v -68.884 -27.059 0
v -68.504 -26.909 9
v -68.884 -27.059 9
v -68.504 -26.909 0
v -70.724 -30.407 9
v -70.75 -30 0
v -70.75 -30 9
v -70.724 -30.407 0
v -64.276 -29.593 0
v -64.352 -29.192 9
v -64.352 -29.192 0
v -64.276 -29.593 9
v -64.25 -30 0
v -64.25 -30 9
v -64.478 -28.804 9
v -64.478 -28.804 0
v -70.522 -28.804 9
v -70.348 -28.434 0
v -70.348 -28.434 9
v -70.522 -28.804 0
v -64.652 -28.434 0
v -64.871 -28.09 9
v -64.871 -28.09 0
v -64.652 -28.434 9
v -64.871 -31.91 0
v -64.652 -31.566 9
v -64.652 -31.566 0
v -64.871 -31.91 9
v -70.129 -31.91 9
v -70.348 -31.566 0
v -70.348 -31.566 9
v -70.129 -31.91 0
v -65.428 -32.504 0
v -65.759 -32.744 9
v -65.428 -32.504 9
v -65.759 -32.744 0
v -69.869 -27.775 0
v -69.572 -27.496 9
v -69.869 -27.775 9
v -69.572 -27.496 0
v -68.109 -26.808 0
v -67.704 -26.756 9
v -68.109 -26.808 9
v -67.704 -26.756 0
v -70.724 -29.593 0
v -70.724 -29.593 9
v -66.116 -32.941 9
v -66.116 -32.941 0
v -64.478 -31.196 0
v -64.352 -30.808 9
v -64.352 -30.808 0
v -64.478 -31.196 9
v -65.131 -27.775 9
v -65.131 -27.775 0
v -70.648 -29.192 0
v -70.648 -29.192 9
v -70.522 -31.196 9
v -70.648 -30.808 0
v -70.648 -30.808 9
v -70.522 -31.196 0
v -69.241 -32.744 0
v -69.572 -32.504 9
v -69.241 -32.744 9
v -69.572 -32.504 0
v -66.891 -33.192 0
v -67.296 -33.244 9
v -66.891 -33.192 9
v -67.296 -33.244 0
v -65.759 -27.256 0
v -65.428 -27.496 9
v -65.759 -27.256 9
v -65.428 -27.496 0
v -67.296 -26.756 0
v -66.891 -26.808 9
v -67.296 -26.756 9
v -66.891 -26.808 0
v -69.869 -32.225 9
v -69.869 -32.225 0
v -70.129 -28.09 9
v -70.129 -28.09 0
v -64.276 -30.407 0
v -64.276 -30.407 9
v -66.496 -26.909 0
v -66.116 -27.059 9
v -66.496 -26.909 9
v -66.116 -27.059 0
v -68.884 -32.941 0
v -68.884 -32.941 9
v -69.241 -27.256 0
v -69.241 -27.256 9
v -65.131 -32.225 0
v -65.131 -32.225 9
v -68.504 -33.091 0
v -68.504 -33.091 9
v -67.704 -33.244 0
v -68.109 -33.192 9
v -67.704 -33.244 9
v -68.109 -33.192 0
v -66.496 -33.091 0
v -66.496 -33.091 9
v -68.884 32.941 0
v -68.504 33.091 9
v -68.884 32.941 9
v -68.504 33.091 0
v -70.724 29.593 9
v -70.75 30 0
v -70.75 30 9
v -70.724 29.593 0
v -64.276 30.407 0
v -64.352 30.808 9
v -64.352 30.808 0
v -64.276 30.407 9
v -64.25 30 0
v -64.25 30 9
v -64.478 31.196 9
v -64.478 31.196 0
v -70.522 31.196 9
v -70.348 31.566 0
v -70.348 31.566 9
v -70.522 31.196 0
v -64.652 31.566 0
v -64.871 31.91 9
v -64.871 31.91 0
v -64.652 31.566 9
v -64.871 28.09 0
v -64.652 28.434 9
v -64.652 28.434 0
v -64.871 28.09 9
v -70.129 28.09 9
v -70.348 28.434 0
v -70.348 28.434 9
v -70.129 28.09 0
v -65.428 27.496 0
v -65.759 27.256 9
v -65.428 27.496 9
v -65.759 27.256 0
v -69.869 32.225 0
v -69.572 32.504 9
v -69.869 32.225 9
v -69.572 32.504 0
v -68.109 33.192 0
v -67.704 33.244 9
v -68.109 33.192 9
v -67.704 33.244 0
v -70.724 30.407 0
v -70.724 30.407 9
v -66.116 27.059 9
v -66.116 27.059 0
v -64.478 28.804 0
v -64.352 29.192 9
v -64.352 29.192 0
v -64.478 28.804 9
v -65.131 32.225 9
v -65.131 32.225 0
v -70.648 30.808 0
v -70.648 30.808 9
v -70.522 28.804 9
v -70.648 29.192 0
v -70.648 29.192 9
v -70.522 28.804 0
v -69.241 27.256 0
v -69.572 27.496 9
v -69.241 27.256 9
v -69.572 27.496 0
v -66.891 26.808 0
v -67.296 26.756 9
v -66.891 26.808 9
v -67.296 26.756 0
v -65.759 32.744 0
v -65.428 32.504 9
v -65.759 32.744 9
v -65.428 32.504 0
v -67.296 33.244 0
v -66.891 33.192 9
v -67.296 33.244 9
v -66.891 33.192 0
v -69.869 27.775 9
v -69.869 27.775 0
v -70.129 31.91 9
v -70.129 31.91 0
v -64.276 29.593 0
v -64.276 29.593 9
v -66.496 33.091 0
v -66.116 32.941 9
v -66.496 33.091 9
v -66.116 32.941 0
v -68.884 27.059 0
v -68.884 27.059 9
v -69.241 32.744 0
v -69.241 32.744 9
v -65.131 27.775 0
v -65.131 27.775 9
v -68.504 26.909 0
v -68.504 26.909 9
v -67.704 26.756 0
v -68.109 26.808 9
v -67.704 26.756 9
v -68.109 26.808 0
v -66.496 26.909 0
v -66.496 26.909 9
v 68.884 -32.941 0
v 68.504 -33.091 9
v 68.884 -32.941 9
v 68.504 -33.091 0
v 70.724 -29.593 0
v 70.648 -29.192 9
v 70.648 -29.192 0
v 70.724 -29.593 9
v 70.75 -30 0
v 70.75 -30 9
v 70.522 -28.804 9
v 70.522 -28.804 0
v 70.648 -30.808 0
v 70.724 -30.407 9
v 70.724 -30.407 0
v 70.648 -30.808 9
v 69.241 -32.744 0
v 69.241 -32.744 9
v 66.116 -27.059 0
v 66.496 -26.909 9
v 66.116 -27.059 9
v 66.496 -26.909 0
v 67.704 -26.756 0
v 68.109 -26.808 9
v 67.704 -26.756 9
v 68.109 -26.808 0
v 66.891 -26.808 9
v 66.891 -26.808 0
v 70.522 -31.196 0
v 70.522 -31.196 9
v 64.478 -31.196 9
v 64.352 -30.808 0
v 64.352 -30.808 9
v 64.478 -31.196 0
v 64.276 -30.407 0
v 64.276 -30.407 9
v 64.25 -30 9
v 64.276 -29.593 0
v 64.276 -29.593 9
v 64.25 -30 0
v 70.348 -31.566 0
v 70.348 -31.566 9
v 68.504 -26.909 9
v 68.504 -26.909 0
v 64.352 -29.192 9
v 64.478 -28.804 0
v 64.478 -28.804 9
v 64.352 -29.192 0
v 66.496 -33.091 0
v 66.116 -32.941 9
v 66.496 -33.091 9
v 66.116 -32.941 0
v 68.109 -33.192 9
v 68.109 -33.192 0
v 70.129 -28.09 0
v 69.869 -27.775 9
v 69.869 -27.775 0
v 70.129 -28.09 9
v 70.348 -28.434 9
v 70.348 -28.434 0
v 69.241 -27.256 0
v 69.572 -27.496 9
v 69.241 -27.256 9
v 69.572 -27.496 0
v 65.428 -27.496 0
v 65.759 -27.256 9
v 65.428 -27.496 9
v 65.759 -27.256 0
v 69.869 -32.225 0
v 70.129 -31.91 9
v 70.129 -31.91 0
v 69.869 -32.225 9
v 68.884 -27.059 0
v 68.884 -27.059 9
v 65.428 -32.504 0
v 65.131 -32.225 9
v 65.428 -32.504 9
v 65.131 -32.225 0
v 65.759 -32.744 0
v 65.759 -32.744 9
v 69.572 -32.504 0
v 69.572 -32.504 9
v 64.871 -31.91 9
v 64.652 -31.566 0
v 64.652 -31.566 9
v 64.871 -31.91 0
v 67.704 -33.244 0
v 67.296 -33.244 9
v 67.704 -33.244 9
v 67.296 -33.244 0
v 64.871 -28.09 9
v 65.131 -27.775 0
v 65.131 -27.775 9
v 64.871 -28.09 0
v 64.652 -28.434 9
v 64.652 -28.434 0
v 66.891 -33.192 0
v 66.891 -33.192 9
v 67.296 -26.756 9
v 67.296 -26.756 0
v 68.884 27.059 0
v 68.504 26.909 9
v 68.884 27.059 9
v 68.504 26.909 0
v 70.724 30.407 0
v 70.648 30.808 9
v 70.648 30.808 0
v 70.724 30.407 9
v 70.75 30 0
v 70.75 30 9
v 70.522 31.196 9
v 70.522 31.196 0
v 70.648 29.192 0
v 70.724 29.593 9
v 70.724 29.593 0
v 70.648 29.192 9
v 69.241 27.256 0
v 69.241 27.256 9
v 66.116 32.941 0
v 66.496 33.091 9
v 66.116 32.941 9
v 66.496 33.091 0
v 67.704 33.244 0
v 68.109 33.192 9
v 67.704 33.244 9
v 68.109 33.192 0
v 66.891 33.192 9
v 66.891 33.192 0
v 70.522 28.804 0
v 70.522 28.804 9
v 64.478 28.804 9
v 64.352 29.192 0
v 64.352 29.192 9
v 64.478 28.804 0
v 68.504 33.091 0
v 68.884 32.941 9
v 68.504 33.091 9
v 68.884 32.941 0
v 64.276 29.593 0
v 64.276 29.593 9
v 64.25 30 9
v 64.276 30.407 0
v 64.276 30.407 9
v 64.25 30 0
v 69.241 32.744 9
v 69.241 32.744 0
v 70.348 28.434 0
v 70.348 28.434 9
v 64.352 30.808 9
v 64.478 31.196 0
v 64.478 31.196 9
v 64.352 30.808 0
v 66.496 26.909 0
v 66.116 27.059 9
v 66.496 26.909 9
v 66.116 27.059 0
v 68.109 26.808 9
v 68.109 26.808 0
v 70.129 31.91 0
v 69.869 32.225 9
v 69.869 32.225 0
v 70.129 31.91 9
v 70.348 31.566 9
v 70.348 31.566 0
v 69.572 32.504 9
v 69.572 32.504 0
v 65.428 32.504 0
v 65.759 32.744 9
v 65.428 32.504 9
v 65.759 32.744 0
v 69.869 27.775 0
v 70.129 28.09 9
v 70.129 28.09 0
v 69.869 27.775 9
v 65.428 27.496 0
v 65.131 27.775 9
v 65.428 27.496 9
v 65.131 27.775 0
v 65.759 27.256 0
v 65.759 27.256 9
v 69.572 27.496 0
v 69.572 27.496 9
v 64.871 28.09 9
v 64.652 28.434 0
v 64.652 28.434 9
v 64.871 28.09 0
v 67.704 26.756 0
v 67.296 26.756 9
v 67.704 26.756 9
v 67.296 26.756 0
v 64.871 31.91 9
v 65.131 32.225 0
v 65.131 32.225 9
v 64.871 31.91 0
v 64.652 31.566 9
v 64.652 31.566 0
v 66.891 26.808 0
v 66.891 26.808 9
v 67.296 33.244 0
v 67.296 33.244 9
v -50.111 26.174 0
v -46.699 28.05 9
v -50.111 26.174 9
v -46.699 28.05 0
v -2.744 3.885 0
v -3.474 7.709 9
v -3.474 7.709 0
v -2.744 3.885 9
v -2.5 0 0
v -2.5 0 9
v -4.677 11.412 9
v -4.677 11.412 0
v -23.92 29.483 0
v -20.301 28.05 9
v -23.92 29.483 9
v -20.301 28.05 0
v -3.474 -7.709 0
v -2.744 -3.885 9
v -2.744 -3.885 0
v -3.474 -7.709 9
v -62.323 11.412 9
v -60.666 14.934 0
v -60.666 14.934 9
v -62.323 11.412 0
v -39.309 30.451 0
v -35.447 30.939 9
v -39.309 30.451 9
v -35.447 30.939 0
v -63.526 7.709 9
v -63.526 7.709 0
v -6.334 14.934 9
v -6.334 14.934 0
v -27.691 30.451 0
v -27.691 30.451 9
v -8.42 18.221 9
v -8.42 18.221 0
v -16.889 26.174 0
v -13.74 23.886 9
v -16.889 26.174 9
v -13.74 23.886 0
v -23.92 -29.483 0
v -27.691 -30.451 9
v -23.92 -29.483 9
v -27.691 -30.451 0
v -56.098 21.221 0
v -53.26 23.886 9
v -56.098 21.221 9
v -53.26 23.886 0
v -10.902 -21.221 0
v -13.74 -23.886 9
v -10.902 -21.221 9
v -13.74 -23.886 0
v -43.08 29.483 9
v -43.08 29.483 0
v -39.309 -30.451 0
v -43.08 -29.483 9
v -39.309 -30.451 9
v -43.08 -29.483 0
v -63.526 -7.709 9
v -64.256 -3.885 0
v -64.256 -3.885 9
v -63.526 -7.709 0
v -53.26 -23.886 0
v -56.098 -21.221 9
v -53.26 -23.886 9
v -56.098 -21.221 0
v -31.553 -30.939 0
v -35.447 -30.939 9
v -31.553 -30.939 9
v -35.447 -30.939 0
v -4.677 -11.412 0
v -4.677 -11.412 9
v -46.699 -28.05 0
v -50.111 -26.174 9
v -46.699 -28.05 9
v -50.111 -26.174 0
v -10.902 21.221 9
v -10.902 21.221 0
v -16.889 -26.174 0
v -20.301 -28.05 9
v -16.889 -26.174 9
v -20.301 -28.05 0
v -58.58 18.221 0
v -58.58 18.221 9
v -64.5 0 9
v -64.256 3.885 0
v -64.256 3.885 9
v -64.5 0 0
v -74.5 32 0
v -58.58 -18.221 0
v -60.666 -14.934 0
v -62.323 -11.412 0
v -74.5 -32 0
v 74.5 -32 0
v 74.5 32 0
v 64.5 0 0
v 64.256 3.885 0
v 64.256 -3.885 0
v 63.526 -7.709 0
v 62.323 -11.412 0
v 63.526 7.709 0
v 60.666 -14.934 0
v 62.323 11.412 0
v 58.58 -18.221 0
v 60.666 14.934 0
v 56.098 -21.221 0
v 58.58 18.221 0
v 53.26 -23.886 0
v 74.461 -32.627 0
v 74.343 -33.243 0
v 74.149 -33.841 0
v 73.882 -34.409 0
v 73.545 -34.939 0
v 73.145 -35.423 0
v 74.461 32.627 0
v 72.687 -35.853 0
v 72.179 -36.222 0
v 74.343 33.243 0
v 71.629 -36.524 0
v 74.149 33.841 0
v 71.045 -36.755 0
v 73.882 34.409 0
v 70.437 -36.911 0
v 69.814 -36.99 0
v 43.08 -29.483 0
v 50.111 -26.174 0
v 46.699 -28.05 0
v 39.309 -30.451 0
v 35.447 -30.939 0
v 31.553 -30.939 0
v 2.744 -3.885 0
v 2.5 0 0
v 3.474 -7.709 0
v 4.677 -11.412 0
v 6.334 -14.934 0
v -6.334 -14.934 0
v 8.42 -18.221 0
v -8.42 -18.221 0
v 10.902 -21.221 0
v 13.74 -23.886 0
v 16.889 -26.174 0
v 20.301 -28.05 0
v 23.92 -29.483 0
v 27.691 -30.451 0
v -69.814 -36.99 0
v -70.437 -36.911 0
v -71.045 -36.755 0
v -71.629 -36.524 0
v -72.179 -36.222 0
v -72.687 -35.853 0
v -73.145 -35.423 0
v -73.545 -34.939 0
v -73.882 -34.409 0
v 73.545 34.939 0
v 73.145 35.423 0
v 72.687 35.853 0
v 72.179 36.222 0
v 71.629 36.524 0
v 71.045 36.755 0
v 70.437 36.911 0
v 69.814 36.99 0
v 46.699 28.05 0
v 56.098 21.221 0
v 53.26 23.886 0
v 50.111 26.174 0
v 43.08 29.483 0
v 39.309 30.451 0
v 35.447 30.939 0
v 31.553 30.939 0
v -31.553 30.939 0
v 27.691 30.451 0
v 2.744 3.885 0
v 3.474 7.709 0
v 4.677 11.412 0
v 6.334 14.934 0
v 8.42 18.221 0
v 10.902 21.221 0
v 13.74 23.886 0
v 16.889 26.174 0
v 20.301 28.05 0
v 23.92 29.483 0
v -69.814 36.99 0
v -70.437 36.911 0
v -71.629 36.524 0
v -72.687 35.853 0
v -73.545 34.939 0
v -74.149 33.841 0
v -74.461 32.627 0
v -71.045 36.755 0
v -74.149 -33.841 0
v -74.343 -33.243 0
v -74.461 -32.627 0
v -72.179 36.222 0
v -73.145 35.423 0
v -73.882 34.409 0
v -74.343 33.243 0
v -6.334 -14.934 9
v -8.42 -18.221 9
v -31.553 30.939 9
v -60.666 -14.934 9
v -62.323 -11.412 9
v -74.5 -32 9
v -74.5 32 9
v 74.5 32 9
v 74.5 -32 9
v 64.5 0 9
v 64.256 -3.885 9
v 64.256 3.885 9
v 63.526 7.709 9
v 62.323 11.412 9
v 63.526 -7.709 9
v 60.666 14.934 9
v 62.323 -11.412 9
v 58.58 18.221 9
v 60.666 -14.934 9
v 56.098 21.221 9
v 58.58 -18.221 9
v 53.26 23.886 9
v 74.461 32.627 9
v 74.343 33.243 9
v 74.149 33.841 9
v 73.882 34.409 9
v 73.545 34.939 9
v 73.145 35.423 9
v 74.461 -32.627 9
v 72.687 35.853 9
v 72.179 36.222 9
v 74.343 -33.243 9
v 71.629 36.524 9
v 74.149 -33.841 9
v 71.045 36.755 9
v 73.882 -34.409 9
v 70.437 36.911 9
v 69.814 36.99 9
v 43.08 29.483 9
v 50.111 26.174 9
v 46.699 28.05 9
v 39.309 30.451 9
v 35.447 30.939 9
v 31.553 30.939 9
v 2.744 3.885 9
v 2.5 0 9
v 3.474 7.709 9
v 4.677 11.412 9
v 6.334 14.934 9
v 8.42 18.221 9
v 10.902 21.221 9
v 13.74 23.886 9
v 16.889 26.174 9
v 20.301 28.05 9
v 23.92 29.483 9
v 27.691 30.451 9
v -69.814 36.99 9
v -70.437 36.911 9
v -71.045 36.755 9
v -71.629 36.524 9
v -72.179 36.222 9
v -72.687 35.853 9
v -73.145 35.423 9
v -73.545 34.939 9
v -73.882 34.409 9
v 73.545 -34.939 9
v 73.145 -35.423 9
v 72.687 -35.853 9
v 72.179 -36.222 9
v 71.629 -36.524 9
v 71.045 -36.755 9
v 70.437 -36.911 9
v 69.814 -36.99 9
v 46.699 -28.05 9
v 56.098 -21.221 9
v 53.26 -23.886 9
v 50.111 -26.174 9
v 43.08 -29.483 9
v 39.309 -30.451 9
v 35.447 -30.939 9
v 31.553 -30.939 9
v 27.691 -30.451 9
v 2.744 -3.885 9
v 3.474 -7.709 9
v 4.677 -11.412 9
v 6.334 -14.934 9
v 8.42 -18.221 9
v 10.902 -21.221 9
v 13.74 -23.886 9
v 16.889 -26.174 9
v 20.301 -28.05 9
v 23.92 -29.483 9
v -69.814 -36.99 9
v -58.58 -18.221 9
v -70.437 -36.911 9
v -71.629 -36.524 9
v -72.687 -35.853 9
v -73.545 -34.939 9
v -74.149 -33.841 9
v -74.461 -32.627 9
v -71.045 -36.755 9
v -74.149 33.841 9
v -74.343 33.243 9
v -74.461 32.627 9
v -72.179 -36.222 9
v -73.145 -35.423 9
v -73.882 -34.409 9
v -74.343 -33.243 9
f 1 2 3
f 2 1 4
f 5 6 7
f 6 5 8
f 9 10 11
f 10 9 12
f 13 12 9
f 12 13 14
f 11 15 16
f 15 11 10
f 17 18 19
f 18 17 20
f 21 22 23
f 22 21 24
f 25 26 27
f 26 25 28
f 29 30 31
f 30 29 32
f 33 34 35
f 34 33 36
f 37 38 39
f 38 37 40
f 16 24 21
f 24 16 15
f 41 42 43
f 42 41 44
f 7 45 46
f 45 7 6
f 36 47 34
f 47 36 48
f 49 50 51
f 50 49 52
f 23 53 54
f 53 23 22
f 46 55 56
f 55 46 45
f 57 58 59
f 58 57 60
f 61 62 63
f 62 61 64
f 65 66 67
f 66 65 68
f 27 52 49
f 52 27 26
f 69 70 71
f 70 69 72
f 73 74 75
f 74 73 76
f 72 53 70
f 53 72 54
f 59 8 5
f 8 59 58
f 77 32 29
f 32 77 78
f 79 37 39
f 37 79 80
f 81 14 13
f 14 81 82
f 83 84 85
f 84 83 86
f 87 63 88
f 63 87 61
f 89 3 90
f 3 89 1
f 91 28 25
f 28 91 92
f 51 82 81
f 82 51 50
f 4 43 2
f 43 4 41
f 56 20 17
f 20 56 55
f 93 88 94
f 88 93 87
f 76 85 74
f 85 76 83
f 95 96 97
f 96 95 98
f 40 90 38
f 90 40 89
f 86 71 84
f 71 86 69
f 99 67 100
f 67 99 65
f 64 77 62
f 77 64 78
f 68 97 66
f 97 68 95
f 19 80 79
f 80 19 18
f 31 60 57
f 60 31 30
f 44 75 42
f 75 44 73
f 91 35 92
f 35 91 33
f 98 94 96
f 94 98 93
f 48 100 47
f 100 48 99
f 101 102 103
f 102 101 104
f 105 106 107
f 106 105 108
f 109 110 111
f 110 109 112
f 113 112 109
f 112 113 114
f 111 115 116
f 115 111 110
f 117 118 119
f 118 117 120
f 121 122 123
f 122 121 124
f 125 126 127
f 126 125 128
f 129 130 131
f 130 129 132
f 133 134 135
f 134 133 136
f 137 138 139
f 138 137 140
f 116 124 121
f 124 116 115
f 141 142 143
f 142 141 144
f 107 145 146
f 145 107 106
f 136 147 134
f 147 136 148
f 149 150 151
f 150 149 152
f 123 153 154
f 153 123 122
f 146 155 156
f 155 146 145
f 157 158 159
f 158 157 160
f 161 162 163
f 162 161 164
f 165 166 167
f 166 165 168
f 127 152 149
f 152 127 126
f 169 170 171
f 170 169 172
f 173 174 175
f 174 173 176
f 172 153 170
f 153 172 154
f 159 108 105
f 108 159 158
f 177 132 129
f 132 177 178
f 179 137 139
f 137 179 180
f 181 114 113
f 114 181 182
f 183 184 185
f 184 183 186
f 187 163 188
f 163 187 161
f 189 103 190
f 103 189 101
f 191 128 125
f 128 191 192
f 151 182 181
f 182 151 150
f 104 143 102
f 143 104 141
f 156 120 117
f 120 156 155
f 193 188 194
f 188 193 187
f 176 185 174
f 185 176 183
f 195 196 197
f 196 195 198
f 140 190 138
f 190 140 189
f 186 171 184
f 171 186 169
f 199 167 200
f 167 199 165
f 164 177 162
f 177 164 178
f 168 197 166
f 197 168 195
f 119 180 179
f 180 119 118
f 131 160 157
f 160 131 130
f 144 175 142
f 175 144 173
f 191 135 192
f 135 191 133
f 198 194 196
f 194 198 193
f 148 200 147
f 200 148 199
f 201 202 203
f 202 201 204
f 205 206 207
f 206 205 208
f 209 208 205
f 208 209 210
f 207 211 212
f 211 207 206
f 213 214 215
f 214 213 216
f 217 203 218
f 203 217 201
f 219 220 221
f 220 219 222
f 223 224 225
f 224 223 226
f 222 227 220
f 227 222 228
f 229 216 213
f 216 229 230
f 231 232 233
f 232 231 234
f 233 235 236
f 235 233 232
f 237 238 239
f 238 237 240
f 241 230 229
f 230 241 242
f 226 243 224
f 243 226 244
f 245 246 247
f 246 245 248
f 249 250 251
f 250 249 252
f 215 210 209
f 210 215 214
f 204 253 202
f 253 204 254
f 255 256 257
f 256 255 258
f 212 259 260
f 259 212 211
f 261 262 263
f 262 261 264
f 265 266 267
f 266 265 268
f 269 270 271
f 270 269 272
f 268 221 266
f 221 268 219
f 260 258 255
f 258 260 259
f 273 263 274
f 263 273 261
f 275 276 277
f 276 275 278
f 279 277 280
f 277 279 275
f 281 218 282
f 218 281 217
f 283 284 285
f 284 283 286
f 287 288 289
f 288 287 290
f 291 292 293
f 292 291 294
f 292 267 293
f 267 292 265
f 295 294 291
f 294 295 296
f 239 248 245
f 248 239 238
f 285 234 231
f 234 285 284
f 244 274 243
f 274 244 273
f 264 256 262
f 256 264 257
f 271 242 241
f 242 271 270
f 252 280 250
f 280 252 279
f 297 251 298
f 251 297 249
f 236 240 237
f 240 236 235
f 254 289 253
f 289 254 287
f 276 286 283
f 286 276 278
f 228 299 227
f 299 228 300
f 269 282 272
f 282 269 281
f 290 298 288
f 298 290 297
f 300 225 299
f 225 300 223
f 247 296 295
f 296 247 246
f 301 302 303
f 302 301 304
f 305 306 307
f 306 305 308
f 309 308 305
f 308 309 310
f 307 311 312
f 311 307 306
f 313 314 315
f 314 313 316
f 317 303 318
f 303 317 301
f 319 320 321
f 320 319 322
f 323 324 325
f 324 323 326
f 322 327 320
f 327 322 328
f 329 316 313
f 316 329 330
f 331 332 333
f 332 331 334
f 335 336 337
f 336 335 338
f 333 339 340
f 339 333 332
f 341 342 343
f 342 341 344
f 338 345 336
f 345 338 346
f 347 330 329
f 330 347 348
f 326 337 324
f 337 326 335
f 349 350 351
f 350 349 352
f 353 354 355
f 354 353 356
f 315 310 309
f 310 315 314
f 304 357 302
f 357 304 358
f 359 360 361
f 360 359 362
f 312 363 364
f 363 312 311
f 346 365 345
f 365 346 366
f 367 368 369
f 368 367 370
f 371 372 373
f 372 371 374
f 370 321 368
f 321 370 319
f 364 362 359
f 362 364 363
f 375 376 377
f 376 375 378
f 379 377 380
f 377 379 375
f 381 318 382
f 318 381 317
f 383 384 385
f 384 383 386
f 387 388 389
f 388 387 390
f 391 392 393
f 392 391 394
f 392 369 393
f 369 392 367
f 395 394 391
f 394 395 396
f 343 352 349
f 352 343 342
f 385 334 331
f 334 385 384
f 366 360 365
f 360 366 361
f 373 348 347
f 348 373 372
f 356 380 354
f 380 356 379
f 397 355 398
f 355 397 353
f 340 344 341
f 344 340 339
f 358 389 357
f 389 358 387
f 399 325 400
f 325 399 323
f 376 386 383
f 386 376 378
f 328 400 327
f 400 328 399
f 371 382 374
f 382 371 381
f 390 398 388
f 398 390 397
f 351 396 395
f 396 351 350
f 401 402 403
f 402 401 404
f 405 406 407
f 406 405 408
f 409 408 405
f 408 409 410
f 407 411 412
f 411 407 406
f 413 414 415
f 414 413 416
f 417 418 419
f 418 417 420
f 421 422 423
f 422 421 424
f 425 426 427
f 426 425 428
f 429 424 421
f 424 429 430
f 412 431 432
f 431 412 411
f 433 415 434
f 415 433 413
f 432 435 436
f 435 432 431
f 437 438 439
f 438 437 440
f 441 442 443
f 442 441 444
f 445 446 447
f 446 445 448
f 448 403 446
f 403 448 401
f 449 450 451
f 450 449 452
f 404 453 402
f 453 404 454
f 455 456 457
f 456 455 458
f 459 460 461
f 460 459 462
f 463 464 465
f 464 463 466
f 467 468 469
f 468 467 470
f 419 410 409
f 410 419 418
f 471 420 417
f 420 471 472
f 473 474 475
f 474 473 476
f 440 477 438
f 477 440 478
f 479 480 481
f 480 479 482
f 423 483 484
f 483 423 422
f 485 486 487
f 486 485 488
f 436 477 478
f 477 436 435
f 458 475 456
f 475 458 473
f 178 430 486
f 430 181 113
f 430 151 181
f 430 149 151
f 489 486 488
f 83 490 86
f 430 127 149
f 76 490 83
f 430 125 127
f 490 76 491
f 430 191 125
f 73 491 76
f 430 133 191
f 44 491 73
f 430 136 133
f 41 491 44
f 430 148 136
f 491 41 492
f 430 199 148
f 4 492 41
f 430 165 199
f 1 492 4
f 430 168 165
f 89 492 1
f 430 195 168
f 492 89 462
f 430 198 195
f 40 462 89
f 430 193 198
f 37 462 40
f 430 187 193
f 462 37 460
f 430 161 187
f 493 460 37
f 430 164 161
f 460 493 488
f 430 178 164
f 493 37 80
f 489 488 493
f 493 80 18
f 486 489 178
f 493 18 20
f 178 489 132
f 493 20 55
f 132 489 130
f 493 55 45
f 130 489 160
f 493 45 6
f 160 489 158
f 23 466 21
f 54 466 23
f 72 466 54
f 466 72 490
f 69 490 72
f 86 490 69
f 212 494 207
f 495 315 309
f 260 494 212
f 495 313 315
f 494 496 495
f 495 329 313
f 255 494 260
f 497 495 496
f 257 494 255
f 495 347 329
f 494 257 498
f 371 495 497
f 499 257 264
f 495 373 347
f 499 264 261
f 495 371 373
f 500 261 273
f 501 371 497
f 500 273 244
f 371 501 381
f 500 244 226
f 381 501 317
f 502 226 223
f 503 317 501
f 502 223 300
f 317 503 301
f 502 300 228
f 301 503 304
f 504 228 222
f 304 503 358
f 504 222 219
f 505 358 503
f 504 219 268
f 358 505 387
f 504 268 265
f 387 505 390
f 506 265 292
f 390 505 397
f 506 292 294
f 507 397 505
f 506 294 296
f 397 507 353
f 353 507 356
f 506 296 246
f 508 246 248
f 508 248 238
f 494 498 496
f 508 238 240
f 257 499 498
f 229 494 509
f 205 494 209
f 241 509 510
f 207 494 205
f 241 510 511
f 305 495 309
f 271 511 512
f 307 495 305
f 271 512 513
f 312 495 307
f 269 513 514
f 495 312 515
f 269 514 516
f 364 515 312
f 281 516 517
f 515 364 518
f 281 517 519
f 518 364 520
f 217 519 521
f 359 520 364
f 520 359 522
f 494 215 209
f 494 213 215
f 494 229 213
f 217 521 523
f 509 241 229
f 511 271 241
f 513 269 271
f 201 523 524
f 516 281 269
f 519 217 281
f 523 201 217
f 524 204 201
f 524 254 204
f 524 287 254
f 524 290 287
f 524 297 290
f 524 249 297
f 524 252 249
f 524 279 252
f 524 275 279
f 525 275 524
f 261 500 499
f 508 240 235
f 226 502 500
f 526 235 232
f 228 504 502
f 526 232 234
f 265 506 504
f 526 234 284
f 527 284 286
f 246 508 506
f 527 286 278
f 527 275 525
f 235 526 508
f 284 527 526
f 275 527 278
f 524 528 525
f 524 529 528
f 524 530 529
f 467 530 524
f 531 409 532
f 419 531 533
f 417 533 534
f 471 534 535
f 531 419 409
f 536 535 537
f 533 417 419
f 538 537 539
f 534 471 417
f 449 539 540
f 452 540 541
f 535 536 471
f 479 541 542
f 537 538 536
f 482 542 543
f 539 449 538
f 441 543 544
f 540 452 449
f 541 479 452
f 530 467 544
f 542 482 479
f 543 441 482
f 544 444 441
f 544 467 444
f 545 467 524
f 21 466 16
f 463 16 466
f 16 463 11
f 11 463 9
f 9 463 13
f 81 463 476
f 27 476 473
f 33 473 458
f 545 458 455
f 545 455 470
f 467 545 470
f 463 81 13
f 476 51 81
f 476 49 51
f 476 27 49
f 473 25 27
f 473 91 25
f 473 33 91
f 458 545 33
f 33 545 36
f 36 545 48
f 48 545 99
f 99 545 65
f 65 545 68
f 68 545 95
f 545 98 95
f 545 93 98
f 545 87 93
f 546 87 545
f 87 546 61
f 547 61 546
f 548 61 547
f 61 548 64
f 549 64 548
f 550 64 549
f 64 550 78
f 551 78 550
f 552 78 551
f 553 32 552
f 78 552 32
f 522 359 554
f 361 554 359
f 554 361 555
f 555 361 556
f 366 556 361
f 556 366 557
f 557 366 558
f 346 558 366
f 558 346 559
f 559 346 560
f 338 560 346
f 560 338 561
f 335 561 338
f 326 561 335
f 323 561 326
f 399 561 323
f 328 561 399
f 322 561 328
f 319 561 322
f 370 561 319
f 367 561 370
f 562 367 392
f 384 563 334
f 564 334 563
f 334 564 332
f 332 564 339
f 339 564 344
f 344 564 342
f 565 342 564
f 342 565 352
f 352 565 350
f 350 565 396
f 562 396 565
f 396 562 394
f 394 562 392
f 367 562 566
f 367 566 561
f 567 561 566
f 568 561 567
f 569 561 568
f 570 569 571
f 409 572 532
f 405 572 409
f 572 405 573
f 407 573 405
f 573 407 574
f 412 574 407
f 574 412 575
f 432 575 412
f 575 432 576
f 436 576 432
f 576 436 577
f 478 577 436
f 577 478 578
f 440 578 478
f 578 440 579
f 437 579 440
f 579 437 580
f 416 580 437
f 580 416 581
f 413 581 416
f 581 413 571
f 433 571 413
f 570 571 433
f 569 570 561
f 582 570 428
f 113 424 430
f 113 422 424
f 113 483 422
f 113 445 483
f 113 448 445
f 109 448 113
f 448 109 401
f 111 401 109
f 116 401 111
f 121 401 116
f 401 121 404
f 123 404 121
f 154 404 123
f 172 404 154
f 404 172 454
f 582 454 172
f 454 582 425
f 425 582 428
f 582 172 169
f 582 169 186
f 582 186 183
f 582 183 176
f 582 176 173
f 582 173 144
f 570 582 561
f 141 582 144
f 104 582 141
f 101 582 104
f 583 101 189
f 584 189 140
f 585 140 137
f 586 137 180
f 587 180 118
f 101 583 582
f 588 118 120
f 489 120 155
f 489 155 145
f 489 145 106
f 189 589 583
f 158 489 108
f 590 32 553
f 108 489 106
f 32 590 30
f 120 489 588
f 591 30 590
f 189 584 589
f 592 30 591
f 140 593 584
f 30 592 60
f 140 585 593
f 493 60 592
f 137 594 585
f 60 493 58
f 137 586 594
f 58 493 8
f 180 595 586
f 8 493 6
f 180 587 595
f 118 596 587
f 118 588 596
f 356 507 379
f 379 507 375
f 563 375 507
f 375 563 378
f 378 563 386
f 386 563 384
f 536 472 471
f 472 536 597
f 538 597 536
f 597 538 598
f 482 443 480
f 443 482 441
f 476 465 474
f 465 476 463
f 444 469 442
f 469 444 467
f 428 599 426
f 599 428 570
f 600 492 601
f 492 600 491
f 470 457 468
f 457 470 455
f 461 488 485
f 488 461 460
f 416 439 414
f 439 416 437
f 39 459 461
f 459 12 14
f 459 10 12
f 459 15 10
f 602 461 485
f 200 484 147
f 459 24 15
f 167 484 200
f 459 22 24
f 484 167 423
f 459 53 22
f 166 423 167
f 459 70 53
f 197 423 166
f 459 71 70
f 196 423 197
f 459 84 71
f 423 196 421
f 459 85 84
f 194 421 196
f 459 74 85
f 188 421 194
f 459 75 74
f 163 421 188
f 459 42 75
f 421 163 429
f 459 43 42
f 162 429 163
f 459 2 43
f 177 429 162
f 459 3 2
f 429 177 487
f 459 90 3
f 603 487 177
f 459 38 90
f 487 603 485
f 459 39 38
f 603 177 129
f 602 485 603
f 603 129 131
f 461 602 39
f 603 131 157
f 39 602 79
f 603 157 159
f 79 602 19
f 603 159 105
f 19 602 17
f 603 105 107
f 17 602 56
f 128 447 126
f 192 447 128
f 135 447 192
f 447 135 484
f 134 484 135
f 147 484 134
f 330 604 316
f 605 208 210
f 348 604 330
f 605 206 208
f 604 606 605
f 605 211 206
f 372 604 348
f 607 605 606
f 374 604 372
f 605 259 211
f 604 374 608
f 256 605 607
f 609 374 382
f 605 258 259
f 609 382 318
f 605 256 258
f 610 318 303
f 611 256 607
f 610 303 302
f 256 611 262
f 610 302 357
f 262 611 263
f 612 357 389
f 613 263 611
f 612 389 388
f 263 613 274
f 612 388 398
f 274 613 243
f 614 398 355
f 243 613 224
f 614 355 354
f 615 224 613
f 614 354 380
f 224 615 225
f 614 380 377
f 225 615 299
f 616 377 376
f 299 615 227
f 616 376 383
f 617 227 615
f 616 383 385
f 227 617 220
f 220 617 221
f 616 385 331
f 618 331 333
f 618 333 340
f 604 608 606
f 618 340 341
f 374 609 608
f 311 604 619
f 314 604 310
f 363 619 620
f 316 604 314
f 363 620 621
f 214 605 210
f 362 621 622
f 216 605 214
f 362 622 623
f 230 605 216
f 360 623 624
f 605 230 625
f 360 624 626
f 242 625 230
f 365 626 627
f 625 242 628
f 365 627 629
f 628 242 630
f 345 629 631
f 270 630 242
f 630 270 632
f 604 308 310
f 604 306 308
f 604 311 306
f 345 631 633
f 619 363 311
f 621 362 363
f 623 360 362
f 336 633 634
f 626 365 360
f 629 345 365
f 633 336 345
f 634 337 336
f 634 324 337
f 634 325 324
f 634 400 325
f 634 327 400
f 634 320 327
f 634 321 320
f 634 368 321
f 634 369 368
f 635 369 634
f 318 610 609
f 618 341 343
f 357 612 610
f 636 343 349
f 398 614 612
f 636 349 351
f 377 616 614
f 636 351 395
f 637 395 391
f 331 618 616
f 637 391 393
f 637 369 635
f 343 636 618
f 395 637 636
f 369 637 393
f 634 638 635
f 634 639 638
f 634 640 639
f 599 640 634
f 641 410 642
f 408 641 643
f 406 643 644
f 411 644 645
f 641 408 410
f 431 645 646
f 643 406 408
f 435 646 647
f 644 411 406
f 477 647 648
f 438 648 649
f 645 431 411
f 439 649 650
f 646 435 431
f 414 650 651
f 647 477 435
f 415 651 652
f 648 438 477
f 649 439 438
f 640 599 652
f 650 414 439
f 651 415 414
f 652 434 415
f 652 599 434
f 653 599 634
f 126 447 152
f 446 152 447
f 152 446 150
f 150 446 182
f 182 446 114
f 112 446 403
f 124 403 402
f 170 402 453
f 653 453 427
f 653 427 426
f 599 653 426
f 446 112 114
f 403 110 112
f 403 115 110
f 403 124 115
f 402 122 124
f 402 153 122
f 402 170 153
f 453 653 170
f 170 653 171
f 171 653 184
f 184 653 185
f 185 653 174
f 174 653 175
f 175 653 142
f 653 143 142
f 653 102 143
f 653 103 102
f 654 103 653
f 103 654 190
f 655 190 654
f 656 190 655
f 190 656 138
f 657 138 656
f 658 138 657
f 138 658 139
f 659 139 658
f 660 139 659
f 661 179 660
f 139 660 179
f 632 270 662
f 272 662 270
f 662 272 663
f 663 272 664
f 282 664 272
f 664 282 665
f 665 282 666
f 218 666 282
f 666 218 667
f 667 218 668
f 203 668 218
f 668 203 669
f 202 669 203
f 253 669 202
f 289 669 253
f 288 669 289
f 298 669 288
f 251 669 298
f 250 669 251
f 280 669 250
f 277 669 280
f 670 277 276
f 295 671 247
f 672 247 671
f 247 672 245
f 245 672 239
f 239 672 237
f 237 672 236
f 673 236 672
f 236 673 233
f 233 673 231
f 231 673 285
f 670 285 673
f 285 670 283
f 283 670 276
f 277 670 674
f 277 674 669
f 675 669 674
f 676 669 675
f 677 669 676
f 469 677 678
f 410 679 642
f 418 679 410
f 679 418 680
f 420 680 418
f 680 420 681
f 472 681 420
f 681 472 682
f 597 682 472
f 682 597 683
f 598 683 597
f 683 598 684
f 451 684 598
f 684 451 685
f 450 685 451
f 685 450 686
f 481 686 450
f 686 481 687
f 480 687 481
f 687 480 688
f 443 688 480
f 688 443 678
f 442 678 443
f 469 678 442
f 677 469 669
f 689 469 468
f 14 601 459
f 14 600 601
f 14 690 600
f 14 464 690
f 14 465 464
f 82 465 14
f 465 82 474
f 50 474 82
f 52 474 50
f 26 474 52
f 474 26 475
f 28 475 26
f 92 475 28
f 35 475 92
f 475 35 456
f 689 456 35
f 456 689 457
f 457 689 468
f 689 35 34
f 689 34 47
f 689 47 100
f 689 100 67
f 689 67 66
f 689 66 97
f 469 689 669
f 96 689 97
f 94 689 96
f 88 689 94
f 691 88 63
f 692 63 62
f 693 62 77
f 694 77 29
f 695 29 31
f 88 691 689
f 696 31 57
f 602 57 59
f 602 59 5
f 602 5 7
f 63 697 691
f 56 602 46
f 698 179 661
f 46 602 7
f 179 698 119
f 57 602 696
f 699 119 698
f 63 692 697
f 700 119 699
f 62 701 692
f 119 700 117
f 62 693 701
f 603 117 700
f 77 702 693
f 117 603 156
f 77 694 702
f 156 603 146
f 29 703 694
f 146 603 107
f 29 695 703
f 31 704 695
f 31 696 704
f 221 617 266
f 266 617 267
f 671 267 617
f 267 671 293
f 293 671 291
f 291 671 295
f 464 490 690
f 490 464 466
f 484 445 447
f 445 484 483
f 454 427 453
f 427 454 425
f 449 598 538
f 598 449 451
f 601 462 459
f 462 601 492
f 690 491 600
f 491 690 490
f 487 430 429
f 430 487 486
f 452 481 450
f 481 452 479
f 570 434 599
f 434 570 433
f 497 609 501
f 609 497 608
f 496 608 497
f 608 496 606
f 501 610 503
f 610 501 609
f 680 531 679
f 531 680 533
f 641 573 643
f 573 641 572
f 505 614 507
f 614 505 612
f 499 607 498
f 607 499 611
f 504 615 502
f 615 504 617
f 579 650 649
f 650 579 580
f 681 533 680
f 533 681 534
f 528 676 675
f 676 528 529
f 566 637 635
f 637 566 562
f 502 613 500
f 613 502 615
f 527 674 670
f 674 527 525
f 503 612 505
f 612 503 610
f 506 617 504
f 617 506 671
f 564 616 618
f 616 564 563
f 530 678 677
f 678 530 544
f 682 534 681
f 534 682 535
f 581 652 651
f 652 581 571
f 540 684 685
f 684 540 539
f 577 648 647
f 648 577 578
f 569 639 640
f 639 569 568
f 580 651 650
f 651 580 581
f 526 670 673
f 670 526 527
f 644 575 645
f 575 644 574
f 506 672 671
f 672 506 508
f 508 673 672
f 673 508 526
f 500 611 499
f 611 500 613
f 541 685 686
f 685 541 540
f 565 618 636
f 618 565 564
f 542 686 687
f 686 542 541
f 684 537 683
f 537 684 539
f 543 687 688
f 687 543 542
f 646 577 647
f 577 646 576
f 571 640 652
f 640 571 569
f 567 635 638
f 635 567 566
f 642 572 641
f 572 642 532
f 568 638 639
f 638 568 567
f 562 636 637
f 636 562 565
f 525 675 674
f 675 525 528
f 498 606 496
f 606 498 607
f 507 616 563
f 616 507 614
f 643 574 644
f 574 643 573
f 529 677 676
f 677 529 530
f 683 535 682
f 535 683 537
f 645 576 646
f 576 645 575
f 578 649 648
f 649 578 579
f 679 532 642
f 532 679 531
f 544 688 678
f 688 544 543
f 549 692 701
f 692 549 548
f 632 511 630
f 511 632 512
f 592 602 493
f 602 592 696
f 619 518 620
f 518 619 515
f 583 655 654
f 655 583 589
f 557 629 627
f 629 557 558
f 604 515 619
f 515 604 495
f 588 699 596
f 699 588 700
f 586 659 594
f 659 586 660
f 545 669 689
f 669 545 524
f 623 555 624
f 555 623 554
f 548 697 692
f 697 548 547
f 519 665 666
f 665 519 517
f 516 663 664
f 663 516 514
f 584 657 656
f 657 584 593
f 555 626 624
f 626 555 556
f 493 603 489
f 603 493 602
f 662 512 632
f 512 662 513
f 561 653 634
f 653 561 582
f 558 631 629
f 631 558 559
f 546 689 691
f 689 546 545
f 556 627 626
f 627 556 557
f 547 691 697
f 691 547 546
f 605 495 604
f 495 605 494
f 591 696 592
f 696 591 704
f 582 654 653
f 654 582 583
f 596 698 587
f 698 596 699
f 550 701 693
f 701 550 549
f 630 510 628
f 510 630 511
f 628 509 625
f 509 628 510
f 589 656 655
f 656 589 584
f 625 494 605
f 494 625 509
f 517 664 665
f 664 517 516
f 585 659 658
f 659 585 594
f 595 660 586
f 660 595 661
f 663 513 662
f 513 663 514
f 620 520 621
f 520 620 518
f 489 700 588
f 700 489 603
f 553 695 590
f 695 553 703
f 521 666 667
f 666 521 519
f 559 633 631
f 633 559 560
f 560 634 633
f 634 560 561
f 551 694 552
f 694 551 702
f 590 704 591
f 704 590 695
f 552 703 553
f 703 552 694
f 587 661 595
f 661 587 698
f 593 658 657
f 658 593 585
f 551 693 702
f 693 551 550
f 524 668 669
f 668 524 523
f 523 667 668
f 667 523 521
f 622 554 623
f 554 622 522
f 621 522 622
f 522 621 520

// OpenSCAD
$fn = 50;


difference() {
	union() {
		hull() {
			translate(v = [-69.5000000000, 32.0000000000, 0]) {
				cylinder(h = 9, r = 5);
			}
			translate(v = [69.5000000000, 32.0000000000, 0]) {
				cylinder(h = 9, r = 5);
			}
			translate(v = [-69.5000000000, -32.0000000000, 0]) {
				cylinder(h = 9, r = 5);
			}
			translate(v = [69.5000000000, -32.0000000000, 0]) {
				cylinder(h = 9, r = 5);
			}
		}
	}
	union() {
		#translate(v = [-67.5000000000, -30.0000000000, -100.0000000000]) {
			cylinder(h = 200, r = 3.2500000000);
		}
		#translate(v = [-67.5000000000, 30.0000000000, -100.0000000000]) {
			cylinder(h = 200, r = 3.2500000000);
		}
		#translate(v = [67.5000000000, -30.0000000000, -100.0000000000]) {
			cylinder(h = 200, r = 3.2500000000);
		}
		#translate(v = [67.5000000000, 30.0000000000, -100.0000000000]) {
			cylinder(h = 200, r = 3.2500000000);
		}
		#translate(v = [-33.5000000000, 0, 0]) {
			cylinder(h = 9, r = 31.0000000000);
		}
		#translate(v = [33.5000000000, 0, 0]) {
			cylinder(h = 9, r = 31.0000000000);
		}
	}
}
